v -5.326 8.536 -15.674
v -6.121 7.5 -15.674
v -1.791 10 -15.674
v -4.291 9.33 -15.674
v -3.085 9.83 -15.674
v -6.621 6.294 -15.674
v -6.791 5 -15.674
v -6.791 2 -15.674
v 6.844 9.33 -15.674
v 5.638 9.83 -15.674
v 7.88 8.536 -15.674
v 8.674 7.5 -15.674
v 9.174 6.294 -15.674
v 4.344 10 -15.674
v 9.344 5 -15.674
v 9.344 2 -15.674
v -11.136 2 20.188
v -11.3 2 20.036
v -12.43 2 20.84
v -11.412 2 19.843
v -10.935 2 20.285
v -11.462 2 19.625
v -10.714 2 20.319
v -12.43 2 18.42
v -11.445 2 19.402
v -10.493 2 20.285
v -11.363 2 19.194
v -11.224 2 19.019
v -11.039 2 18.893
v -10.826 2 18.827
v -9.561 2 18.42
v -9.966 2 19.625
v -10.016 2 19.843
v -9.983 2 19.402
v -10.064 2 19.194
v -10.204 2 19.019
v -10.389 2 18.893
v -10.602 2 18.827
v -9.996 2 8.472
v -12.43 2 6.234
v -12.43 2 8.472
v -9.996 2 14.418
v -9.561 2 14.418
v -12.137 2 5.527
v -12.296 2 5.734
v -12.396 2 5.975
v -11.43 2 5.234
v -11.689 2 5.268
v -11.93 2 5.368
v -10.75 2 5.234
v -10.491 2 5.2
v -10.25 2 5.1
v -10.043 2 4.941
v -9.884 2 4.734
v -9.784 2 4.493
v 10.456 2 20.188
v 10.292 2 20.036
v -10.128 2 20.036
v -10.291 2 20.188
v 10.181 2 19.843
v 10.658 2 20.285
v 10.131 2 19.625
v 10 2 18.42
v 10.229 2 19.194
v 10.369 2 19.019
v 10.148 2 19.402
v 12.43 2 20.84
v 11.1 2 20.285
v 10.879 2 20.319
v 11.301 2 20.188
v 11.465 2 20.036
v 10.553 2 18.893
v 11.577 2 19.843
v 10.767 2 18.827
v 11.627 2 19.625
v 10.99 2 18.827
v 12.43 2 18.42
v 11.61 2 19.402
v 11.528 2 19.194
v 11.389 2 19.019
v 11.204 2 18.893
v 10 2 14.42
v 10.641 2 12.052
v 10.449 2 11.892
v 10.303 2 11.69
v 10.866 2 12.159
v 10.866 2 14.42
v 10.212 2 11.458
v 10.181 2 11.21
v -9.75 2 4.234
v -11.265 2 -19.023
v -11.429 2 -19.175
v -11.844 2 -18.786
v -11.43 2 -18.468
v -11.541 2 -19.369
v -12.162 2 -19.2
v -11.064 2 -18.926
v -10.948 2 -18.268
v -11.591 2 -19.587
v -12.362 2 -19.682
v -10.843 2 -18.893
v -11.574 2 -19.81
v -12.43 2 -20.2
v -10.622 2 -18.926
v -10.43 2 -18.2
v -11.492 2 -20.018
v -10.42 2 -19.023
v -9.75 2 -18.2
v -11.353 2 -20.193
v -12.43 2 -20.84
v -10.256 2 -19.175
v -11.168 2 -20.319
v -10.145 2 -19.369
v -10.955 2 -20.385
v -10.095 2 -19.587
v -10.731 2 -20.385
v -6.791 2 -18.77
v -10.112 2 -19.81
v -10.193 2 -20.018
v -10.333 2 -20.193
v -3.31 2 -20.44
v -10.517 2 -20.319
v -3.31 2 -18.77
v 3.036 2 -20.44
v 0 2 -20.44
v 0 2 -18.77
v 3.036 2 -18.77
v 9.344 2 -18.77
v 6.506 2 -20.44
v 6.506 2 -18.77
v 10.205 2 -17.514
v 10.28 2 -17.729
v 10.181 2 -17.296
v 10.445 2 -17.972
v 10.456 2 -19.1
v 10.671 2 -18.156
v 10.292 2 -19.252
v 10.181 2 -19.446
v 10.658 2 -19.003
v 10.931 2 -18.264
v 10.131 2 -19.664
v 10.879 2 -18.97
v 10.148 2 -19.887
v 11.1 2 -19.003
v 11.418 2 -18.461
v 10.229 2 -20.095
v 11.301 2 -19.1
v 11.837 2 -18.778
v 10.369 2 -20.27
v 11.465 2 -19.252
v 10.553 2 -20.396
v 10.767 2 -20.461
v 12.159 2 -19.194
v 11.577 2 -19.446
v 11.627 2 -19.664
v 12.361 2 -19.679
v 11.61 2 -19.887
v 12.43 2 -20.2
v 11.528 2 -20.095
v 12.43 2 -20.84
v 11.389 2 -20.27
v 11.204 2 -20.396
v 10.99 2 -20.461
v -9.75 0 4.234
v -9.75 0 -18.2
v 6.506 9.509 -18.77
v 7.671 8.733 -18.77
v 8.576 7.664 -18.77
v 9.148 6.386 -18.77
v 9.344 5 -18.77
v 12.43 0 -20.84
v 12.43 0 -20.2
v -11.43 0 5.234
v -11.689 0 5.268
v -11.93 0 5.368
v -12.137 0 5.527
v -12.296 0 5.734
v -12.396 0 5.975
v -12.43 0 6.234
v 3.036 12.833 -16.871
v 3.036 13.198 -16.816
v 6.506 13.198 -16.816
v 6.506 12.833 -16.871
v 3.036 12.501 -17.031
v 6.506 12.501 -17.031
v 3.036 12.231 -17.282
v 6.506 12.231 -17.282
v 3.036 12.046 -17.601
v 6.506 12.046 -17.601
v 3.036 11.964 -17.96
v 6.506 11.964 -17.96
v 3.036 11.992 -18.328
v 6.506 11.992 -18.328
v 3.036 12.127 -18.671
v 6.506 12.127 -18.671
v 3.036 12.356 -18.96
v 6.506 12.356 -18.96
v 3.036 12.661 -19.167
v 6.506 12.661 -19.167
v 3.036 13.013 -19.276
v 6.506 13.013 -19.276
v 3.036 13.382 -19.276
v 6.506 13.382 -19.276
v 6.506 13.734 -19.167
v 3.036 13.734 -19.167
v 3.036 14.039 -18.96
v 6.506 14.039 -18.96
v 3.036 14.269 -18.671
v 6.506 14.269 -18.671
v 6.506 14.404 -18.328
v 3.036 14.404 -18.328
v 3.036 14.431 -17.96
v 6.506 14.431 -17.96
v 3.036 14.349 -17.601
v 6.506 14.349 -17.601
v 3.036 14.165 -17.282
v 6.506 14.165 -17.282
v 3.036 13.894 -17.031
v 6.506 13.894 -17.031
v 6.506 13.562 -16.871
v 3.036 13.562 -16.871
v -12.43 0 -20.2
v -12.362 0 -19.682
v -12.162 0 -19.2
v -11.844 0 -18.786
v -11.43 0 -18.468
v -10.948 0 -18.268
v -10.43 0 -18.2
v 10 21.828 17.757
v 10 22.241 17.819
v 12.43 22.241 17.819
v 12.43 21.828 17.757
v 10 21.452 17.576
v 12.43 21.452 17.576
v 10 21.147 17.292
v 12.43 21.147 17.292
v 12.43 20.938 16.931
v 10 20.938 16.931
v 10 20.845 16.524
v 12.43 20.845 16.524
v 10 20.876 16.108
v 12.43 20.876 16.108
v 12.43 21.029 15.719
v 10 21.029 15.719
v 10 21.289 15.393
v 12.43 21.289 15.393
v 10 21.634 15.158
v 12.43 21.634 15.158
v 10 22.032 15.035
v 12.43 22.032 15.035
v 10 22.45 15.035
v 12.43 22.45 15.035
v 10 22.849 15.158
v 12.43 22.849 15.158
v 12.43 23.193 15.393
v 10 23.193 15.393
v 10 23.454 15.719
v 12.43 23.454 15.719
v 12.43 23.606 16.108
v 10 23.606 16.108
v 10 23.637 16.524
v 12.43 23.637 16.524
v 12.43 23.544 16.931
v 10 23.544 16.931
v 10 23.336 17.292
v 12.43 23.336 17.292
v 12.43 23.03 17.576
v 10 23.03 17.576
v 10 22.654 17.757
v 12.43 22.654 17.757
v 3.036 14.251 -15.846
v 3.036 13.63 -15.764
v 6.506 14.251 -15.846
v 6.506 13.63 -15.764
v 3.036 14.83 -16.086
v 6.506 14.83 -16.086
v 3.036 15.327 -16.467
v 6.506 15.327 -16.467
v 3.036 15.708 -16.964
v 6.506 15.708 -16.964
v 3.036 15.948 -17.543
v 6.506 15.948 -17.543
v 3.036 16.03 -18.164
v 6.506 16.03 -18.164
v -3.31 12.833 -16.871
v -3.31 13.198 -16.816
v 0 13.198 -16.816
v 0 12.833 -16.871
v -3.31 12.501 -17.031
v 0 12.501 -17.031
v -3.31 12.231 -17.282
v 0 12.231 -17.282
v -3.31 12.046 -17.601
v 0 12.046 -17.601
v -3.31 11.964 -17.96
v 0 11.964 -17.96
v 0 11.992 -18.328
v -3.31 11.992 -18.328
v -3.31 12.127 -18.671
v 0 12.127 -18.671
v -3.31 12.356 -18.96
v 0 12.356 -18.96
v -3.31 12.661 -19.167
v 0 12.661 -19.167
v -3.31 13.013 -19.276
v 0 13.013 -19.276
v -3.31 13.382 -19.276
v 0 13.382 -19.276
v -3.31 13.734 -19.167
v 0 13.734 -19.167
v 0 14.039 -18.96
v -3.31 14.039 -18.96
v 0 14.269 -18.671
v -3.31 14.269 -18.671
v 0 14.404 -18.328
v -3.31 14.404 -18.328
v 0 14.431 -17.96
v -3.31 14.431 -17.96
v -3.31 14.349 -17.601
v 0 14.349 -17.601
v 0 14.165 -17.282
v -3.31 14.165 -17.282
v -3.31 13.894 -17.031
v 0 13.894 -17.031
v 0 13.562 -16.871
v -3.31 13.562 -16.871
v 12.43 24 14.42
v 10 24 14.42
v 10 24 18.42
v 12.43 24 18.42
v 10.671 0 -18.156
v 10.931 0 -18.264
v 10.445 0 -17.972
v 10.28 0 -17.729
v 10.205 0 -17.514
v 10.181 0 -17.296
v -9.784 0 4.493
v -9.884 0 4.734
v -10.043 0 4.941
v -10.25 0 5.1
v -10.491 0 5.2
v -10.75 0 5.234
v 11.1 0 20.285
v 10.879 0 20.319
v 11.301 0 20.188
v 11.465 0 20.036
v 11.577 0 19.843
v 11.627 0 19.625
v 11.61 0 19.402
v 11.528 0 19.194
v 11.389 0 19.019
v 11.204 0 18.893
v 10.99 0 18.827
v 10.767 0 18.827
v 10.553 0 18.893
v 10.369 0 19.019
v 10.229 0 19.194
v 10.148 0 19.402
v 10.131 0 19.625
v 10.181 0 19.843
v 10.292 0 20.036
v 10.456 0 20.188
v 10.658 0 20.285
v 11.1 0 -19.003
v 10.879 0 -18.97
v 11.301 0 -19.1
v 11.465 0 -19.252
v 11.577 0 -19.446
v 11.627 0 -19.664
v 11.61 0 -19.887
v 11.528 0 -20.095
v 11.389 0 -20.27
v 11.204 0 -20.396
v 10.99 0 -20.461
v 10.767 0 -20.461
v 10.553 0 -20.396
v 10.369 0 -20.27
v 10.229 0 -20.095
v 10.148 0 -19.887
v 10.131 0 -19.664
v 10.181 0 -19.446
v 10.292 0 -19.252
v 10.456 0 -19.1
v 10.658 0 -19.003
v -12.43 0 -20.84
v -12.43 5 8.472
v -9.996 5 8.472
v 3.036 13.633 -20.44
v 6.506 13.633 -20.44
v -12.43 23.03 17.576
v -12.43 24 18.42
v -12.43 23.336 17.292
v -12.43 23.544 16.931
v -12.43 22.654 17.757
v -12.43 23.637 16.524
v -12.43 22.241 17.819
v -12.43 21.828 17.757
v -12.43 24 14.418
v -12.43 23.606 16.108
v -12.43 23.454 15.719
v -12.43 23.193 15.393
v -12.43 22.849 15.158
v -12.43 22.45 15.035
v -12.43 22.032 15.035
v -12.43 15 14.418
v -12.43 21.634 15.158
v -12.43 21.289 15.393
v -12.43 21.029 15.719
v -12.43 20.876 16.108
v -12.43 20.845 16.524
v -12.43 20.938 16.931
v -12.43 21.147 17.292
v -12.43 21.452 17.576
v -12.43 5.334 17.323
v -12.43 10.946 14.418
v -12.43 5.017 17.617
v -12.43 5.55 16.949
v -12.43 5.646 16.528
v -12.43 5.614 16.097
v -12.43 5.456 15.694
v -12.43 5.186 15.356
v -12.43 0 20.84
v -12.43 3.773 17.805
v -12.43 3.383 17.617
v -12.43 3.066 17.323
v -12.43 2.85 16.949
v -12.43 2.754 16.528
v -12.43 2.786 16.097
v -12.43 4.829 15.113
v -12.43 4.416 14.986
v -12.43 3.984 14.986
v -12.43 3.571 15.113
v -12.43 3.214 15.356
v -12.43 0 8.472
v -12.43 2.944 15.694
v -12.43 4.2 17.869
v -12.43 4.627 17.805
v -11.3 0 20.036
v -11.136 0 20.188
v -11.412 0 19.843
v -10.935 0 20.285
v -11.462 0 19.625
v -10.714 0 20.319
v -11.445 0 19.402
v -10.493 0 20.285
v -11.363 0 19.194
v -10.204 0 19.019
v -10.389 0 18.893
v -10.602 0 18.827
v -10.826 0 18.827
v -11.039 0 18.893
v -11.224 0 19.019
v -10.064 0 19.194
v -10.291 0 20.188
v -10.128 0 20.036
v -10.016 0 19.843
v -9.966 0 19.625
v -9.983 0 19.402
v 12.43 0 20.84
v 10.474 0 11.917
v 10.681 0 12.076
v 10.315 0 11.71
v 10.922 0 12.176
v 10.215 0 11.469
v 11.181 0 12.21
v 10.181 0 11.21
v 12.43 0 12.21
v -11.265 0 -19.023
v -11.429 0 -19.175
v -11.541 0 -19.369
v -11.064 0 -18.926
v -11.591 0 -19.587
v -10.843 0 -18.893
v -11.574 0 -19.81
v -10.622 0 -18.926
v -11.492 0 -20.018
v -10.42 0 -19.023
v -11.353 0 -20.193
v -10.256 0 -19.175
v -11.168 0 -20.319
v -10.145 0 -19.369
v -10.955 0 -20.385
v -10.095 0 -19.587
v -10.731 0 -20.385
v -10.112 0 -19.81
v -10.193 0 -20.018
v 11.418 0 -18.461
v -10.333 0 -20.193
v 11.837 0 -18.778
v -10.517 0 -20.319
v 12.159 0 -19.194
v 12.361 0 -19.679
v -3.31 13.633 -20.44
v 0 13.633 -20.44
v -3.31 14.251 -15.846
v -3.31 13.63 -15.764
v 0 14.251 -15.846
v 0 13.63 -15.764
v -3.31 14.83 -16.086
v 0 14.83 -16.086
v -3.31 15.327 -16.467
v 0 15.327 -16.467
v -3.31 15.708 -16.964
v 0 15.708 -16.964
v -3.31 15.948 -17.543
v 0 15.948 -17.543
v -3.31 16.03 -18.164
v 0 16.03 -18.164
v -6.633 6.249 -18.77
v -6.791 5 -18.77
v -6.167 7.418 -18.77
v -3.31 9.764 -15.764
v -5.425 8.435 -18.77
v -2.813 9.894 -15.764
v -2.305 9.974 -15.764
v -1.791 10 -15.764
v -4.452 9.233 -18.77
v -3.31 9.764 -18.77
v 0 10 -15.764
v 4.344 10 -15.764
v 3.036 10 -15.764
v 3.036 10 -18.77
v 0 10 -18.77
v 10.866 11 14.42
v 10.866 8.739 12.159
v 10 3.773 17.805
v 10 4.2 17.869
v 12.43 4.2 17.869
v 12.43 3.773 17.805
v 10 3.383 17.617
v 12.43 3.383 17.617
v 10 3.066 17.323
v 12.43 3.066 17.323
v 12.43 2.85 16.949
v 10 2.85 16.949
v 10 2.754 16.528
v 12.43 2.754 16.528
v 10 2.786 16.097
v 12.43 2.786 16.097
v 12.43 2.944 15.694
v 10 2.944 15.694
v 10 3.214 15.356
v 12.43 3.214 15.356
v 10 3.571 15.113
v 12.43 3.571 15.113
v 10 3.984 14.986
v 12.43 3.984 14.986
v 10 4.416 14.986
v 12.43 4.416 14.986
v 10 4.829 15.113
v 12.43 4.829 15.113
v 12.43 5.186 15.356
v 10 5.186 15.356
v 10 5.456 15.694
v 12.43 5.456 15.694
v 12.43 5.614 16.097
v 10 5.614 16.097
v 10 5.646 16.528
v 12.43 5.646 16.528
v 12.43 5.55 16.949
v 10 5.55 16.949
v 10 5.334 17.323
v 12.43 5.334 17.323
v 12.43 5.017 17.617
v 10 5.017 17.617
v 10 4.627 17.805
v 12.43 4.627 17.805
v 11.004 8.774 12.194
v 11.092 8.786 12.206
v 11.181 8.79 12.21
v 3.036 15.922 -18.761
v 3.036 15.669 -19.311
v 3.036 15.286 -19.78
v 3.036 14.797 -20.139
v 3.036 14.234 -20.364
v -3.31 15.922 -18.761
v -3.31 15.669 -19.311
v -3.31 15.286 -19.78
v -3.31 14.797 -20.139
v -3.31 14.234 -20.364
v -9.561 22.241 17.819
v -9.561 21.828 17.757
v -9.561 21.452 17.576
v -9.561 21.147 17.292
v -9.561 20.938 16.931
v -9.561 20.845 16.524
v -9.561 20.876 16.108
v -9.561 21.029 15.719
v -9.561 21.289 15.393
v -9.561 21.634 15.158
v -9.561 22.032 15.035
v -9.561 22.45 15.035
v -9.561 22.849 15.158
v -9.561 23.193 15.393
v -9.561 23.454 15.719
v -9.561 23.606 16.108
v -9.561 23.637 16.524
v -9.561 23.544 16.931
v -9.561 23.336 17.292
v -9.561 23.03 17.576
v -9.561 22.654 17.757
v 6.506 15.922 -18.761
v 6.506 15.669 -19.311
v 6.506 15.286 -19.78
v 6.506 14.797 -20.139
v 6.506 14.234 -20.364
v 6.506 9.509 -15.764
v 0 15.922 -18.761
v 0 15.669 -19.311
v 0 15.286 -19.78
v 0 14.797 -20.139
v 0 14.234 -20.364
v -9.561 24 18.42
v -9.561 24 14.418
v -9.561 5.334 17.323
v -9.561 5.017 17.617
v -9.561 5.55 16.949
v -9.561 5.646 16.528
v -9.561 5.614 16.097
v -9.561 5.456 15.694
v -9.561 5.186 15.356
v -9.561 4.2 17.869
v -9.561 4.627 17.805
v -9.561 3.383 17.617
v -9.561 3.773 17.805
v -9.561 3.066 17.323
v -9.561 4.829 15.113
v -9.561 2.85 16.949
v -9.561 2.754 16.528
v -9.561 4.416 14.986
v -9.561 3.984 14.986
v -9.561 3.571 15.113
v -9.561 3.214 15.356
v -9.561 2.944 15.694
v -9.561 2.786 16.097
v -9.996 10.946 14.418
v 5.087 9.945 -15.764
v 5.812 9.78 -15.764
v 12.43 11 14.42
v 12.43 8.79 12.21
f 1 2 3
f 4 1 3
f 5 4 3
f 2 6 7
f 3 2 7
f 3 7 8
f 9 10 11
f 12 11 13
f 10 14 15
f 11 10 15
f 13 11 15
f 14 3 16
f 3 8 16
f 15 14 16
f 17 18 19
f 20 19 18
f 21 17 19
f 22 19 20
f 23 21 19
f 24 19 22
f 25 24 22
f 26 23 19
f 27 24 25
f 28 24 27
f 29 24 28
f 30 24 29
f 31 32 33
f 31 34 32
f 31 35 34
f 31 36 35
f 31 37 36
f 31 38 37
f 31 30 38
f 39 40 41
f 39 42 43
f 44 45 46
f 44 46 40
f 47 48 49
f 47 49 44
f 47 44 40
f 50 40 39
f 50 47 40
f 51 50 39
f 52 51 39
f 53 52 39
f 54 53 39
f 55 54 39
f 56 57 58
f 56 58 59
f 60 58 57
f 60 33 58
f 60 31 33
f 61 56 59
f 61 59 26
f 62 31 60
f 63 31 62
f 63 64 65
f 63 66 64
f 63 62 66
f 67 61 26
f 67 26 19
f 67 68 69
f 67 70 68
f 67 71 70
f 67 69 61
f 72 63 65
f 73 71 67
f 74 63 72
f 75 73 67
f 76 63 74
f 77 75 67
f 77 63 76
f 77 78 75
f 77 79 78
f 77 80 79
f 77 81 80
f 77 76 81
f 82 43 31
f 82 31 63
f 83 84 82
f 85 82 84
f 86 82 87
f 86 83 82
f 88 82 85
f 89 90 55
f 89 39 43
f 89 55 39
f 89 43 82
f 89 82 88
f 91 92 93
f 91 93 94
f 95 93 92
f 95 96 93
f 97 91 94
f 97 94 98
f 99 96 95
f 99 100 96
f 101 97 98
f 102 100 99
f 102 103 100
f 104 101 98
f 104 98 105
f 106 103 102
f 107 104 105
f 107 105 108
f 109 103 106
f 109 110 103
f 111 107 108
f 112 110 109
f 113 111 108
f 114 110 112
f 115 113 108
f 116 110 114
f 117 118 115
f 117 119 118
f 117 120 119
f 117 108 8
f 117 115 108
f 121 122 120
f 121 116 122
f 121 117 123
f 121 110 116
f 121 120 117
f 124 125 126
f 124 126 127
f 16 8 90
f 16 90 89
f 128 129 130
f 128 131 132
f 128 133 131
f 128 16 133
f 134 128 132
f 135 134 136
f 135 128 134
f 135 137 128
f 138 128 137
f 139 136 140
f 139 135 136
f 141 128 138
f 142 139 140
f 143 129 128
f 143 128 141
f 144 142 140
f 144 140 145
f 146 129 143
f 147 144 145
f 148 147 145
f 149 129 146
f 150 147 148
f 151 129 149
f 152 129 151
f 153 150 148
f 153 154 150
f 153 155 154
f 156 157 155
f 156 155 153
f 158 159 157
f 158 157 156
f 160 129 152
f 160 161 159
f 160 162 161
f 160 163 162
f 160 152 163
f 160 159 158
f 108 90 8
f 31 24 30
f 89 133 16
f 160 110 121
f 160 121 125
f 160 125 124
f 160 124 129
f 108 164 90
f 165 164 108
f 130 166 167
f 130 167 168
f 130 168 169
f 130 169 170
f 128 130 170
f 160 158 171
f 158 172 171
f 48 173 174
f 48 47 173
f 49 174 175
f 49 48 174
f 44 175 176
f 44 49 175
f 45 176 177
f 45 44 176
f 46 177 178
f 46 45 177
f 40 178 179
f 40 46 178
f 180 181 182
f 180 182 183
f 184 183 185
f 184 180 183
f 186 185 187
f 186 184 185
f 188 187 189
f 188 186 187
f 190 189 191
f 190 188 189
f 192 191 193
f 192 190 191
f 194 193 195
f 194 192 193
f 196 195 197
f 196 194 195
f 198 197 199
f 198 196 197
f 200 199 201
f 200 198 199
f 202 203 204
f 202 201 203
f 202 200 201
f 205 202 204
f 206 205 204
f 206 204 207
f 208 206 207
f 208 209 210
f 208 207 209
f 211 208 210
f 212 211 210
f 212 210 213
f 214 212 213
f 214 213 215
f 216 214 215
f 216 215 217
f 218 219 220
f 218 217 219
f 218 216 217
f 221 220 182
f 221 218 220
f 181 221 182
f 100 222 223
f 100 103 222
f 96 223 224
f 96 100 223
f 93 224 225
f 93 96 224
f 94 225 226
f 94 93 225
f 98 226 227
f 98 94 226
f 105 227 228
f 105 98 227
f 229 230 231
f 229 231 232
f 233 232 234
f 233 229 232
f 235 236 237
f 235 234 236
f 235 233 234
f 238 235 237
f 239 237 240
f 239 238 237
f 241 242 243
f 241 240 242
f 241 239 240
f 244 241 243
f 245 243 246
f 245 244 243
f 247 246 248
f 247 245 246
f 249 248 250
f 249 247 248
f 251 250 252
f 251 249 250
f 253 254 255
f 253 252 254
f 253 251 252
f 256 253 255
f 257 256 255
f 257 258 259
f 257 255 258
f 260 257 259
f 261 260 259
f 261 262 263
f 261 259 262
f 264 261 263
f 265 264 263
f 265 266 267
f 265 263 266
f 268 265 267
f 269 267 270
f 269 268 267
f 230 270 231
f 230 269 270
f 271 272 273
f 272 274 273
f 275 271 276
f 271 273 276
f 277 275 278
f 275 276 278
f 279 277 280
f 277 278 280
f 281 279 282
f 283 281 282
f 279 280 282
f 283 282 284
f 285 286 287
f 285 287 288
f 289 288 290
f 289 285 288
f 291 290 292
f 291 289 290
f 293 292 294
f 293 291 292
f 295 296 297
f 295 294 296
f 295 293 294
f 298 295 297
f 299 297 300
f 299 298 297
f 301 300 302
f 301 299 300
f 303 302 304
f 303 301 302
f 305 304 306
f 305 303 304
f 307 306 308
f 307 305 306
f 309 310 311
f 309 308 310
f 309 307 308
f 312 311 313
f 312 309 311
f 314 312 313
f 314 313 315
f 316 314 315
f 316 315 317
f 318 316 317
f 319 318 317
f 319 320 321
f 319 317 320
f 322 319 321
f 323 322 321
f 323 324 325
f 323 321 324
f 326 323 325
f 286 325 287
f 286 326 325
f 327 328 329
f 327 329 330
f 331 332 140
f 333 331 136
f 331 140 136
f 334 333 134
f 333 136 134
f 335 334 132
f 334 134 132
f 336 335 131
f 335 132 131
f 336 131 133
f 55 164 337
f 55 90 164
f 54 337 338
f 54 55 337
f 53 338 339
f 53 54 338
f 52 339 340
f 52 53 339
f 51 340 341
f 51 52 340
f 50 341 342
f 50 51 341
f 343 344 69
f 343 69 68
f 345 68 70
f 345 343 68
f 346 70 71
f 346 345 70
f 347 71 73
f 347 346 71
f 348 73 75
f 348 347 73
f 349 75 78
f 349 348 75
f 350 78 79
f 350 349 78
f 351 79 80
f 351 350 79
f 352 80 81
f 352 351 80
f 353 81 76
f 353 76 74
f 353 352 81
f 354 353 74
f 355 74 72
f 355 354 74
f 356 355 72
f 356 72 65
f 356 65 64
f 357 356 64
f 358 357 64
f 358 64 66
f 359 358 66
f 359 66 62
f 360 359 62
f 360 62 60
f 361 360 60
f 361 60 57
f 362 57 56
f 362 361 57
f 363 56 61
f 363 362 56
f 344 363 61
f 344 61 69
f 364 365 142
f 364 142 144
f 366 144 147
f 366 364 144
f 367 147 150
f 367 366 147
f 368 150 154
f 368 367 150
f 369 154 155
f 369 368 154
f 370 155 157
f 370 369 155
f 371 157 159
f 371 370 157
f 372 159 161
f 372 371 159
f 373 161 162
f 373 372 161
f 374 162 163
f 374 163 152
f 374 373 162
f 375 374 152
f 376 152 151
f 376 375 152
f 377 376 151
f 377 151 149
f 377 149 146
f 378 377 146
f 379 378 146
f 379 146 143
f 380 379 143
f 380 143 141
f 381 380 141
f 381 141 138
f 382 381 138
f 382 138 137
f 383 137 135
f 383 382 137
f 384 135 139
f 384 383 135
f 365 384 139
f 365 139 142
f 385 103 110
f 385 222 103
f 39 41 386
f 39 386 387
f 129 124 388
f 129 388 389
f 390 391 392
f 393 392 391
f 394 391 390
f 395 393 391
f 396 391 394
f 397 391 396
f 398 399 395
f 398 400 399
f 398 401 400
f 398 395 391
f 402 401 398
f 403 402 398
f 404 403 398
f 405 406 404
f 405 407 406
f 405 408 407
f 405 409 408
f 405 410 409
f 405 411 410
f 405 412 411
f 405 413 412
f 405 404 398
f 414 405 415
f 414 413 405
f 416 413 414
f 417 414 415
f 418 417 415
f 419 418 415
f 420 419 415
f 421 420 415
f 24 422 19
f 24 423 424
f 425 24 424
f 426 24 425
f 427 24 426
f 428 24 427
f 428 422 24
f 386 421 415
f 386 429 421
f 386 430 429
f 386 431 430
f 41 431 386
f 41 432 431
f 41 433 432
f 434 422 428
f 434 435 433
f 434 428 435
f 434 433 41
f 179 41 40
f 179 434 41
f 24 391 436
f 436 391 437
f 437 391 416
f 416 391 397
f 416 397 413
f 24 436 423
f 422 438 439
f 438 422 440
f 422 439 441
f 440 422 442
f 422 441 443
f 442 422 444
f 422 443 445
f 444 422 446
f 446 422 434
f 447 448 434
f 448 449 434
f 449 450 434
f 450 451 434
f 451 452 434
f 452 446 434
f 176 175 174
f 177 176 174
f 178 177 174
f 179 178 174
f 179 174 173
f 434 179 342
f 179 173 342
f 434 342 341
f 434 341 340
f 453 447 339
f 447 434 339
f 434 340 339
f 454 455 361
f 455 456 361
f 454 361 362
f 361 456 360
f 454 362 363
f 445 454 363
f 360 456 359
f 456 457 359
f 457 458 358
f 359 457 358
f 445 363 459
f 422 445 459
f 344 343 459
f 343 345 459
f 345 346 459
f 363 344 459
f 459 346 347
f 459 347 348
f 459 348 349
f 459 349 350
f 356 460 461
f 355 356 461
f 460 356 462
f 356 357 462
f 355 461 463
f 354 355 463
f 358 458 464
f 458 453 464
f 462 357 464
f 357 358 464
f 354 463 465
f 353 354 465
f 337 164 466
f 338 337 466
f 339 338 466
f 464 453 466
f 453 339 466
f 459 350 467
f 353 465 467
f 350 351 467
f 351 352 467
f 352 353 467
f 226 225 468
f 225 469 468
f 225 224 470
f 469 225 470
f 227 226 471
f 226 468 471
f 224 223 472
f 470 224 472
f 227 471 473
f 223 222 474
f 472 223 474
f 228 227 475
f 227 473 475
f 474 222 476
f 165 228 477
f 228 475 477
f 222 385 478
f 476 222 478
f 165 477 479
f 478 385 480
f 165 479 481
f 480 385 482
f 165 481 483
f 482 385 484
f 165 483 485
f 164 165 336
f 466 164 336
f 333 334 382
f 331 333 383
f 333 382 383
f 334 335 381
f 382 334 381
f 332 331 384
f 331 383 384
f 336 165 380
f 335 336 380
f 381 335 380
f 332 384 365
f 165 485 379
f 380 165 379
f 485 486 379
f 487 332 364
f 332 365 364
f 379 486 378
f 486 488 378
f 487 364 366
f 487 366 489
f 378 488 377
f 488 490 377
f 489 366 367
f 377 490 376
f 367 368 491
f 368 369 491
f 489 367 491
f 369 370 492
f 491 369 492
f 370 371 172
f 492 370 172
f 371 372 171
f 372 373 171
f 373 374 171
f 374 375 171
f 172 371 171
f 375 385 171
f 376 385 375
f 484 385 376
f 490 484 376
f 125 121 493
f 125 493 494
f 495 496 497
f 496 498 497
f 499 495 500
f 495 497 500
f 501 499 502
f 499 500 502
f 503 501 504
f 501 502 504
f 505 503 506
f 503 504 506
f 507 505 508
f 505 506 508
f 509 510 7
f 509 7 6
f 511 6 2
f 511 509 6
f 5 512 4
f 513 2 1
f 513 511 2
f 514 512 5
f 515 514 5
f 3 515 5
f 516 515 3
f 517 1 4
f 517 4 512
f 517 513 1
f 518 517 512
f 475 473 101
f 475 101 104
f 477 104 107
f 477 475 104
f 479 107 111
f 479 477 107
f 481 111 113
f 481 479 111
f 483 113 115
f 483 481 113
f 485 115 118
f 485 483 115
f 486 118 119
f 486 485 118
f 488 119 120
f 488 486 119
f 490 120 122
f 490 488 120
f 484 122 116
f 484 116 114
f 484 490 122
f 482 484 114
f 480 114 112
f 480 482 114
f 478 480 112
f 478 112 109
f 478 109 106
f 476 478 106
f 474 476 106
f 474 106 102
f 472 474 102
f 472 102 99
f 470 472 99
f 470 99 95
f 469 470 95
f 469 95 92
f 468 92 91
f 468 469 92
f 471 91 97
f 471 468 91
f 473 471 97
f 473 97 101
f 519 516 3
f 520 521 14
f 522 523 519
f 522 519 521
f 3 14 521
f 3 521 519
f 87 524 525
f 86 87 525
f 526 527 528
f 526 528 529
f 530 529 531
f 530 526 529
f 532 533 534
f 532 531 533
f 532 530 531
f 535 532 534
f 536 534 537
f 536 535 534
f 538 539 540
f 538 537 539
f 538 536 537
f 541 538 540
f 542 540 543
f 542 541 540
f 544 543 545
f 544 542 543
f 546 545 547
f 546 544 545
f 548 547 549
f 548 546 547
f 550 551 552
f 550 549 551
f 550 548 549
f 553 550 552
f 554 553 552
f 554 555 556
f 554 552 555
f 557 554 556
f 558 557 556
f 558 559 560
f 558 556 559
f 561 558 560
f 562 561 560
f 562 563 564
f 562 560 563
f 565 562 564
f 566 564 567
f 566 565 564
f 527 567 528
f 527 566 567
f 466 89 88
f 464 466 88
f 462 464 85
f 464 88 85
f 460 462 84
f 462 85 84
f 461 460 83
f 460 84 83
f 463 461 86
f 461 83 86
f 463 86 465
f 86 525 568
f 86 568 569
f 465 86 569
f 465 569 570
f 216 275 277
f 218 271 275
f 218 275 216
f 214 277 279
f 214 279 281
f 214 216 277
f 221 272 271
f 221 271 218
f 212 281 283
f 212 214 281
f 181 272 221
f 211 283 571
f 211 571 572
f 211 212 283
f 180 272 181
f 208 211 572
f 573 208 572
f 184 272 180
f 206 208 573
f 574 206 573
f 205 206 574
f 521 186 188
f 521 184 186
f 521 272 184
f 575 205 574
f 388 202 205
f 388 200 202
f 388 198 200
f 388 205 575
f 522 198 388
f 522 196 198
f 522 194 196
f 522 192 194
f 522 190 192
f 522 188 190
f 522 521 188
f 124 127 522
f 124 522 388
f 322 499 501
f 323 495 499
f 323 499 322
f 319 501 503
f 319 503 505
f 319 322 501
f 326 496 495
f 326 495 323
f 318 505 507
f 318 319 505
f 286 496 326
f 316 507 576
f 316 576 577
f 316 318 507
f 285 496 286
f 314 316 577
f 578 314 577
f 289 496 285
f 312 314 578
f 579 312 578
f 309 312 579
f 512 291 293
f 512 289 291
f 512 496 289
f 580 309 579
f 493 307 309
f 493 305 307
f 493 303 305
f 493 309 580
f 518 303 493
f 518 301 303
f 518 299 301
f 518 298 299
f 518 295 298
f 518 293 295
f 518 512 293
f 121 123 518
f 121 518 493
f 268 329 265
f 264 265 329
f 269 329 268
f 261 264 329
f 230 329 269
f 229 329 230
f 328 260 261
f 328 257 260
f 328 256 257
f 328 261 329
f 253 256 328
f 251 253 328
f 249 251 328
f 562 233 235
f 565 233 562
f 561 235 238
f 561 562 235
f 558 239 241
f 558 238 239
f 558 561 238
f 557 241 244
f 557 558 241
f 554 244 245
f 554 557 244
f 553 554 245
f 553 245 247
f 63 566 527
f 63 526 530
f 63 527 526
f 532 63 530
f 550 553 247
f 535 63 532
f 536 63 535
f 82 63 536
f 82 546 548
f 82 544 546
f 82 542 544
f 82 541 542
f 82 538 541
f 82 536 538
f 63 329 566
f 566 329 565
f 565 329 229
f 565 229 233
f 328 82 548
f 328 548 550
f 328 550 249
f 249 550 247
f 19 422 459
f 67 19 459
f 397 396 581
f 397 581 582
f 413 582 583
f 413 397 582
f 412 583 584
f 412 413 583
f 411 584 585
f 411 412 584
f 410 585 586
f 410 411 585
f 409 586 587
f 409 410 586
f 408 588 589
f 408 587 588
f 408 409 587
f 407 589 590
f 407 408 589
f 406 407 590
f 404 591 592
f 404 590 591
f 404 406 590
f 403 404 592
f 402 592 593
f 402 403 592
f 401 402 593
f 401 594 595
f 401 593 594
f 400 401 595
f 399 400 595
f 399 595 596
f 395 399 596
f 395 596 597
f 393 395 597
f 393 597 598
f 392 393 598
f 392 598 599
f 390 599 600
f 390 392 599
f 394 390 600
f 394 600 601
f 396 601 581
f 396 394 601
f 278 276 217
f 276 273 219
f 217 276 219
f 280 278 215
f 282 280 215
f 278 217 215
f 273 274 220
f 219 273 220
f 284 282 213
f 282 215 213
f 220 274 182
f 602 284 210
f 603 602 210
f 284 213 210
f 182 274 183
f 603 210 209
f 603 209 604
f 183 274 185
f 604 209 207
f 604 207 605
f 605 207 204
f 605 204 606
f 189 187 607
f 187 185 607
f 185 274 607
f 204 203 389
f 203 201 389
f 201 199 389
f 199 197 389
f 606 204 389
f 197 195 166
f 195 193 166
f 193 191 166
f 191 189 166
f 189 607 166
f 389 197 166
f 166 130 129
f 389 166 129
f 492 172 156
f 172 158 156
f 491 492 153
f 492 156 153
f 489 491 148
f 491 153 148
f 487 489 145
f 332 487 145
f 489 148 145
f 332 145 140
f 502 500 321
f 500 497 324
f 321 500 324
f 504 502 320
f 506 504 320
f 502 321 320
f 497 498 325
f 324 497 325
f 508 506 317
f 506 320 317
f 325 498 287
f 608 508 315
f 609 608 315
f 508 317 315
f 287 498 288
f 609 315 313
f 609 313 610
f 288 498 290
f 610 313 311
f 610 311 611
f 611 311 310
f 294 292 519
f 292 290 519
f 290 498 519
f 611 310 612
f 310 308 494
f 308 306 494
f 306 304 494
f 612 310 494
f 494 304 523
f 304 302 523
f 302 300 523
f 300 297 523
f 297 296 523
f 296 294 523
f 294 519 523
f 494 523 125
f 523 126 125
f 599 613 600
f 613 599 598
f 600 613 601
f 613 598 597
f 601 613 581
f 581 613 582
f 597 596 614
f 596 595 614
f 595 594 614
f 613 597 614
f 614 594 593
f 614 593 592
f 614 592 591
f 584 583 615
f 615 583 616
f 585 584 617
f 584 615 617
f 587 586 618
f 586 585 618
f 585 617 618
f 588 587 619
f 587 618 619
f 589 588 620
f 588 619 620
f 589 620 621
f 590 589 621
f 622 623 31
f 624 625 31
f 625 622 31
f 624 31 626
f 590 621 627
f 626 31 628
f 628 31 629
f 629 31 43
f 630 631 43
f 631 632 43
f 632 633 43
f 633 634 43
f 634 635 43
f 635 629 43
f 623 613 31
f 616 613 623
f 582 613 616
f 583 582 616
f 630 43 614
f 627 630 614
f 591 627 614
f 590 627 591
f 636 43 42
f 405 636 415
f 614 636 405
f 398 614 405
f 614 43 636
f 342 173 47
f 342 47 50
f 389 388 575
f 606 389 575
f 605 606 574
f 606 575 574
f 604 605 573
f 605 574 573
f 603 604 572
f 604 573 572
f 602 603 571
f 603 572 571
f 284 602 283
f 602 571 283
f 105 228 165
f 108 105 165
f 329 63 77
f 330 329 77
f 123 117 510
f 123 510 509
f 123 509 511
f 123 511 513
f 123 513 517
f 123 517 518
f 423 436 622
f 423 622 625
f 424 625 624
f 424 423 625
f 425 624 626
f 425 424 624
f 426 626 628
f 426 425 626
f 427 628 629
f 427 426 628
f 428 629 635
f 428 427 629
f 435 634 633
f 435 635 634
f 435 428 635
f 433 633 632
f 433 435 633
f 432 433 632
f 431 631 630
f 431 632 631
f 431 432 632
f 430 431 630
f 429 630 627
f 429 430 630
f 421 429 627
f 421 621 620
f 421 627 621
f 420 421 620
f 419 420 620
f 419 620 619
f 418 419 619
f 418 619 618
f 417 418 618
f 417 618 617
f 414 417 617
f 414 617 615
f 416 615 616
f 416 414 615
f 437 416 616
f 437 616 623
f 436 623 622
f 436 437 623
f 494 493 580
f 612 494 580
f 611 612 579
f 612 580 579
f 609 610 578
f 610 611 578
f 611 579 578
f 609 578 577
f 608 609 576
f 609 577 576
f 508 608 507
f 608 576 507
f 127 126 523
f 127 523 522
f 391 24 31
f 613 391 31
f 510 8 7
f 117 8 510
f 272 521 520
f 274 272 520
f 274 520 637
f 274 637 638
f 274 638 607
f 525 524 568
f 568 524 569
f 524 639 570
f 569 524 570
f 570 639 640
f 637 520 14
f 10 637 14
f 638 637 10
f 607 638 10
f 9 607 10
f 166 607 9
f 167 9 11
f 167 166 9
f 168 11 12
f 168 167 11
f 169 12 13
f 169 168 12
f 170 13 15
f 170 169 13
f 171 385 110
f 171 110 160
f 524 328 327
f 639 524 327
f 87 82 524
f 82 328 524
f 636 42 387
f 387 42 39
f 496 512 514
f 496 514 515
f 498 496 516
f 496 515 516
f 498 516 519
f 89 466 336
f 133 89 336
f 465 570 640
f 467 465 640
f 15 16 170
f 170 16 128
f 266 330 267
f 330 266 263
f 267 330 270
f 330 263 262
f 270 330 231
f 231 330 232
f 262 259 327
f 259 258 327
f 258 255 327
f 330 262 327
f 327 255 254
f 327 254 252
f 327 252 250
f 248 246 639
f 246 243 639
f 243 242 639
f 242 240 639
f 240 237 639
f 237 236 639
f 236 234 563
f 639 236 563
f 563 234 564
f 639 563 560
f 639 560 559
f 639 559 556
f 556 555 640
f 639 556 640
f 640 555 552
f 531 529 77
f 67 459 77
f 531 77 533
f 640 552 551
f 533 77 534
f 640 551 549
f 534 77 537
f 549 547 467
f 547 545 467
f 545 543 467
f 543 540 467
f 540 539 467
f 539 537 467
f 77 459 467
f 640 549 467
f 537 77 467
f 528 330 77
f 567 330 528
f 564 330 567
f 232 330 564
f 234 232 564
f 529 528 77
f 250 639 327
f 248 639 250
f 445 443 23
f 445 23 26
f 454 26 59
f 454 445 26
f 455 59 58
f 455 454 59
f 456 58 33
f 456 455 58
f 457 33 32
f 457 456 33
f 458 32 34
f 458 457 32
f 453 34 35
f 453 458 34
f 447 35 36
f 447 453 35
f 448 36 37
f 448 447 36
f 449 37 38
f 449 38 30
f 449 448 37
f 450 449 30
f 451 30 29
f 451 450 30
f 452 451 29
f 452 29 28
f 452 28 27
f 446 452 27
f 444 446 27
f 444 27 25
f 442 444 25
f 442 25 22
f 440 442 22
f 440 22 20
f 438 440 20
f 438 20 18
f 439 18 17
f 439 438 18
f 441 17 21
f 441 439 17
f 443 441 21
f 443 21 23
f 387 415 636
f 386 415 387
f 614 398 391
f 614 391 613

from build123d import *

# Parameters (mm, degrees)
SKETCH_1_W                = 24.86
SKETCH_1_H                = 41.68
SKETCH_1_R                = 0.75
EXTRUDE_2_DEPTH           = 2
SKETCH_4_W                = 2.869231424
SKETCH_4_H                = 4.001531821
SKETCH_4_W_2              = 2.43
SKETCH_4_H_2              = 4
EXTRUDE_3_DEPTH           = 24
SKETCH_8_W                = 3.310255182
SKETCH_8_H                = 4.675588029
SKETCH_8_W_2              = 3.47
EXTRUDE_5_DEPTH           = 16.03
FILLET_5_R                = 2.4
FILLET_6_R                = 2.4
FILLET_7_R                = 2.4
FILLET_8_R                = 2.4
CUT_EXTRUDE_7_DEPTH       = 16.03
CUT_EXTRUDE_7_DEPTH_BACK  = 16.03
SKETCH_13_R               = 1.236878532
CUT_EXTRUDE_8_DEPTH       = 16.03
CUT_EXTRUDE_8_DEPTH_BACK  = 16.03
SKETCH_5_R                = 1.45
CUT_EXTRUDE_9_DEPTH       = 16.03
CUT_EXTRUDE_9_DEPTH_BACK  = 16.03
SKETCH_14_R               = 1.4
SKETCH_16_W               = 16.135324728
SKETCH_16_H               = 3.096678483
EXTRUDE_8_DEPTH           = 10
FILLET_10_R               = 5
FILLET_13_R               = 5
SKETCH_17_W               = 2.433704545
SKETCH_17_H               = 5.946026496
SKETCH_17_W_2             = 1.564461462
SKETCH_17_H_2             = 6
EXTRUDE_9_DEPTH           = 15
CHAMFER_1_SIZE            = 10
CHAMFER_2_SIZE            = 10
CUT_EXTRUDE_16_DEPTH      = 10
CUT_EXTRUDE_16_DEPTH_BACK = 10
SKETCH_19_W               = 2.68
SKETCH_19_H               = 23.433804394
CUT_EXTRUDE_17_DEPTH      = 10
CUT_EXTRUDE_17_DEPTH_BACK = 10
SKETCH_18_W               = 2.24898196
SKETCH_18_H               = 30.410340658
FILLET_17_R               = 2
FILLET_18_R               = 2
FILLET_19_R               = 1


with BuildPart() as part:
    # 草图1 → 凸台-拉伸2 (new body)
    with BuildSketch(Plane(origin=(0, 0, 0), x_dir=(1, 0, 0), z_dir=(0, 1, 0))):
        Rectangle(SKETCH_1_W, SKETCH_1_H)
        with Locations(Location((-10.842762007, 19.642978565, 0), (0, 0, 270))):
            Circle(SKETCH_1_R, mode=Mode.SUBTRACT)
        with Locations(Location((10.87870886, 19.719816311, 0), (0, 0, 270))):
            Circle(SKETCH_1_R, mode=Mode.SUBTRACT)
        with Locations(Location((-10.713936696, -19.568538996, 0), (0, 0, 270))):
            Circle(SKETCH_1_R, mode=Mode.SUBTRACT)
        with Locations(Location((10.87870886, -19.568538996, 0), (0, 0, 270))):
            Circle(SKETCH_1_R, mode=Mode.SUBTRACT)
    extrude(amount=EXTRUDE_2_DEPTH)

    # 草图4 → 凸台-拉伸3 (add)
    with BuildSketch(Plane(origin=(0, 0, 0), x_dir=(1, 0, 0), z_dir=(0, 1, 0))):
        with Locations((-10.995384288, -16.41923409)):
            Rectangle(SKETCH_4_W, SKETCH_4_H)
        with Locations((11.215, -16.42)):
            Rectangle(SKETCH_4_W_2, SKETCH_4_H_2)
    extrude(amount=EXTRUDE_3_DEPTH)

    # 草图8 → 凸台-拉伸5 (add)
    with BuildSketch(Plane(origin=(0, 0, 0), x_dir=(1, 0, 0), z_dir=(0, 1, 0))):
        with Locations((-1.655127591, 18.102205985)):
            Rectangle(SKETCH_8_W, SKETCH_8_H)
        with Locations((4.770502505, 18.102205985)):
            Rectangle(SKETCH_8_W_2, SKETCH_8_H)
    extrude(amount=EXTRUDE_5_DEPTH)

    # 圆角5
    fillet_5_edges = [part.edges().sort_by_distance(p)[0] for p in [
        (-1.655127591, 16.03, -15.764411971),
    ]]
    fillet(fillet_5_edges, radius=FILLET_5_R)

    # 圆角6
    fillet_6_edges = [part.edges().sort_by_distance(p)[0] for p in [
        (4.770502505, 16.03, -15.764411971),
    ]]
    fillet(fillet_6_edges, radius=FILLET_6_R)

    # 圆角7
    # the kernel refuses this fillet: 2.4 mm, written as the material it takes off along each edge
    with BuildSketch(Plane(origin=(-2.956430437, 16.03, -20.44), x_dir=(0, 0, 1), z_dir=(1, 0, 0))) as fillet_7_piece_1_section:
        with BuildLine():
            CenterArc((2.4, 2.396773177), FILLET_7_R, 180, 87.028551133)
            Line((0, 2.396773177), (0, 0))
            Line((0, 0), (2.275588029, 0))
        make_face()
    fillet_7_piece_1 = extrude(amount=15.453865884, mode=Mode.PRIVATE)
    fillet_7_piece_1 = split(fillet_7_piece_1, bisect_by=Plane(origin=(0, 16.03, -20.44), z_dir=(1, 0, 0)), keep=Keep.TOP, mode=Mode.PRIVATE)
    add(fillet_7_piece_1, mode=Mode.SUBTRACT)

    # 圆角8
    # the kernel refuses this fillet: 2.4 mm, written as the material it takes off along each edge
    with BuildSketch(Plane(origin=(-9.302188124, 16.03, -20.44), x_dir=(0, 0, 1), z_dir=(1, 0, 0))) as fillet_8_piece_1:
        with BuildLine():
            CenterArc((2.4, 2.396773177), FILLET_8_R, 180, 87.028551133)
            Line((0, 2.396773177), (-0.048, 2.396773177))
            Line((-0.048, 2.396773177), (-0.048, 0))
            Line((-0.048, 0), (0, -0.048))
            ThreePointArc((0, -0.048), (1.137794014, -0.048), (2.273099789, -0.047935464))
            Line((2.273099789, -0.047935464), (2.275588029, 0))
        make_face()
    extrude(amount=15.294121066, mode=Mode.SUBTRACT)

    # 草图13 → 切除-拉伸7 (cut, two sides: drawn at the far end of the back side and taken through both)
    with BuildSketch(Plane(origin=(0, 0, 0), x_dir=(0, 0, -1), z_dir=(1, 0, 0)).offset(-CUT_EXTRUDE_7_DEPTH_BACK)):
        with Locations(Location((18.052862707, 13.197698645, 0), (0, 0, 180))):
            Circle(SKETCH_13_R)
    extrude(amount=CUT_EXTRUDE_7_DEPTH + CUT_EXTRUDE_7_DEPTH_BACK, mode=Mode.SUBTRACT)

    # 草图5 → 切除-拉伸8 (cut, two sides: drawn at the far end of the back side and taken through both)
    with BuildSketch(Plane(origin=(0, 0, 0), x_dir=(0, 0, -1), z_dir=(1, 0, 0)).offset(-CUT_EXTRUDE_8_DEPTH_BACK)):
        with Locations(Location((-16.419309005, 4.2, 0), (0, 0, 180))):
            Circle(SKETCH_5_R)
    extrude(amount=CUT_EXTRUDE_8_DEPTH + CUT_EXTRUDE_8_DEPTH_BACK, mode=Mode.SUBTRACT)

    # 草图14 → 切除-拉伸9 (cut, two sides: drawn at the far end of the back side and taken through both)
    with BuildSketch(Plane(origin=(0, 0, 0), x_dir=(0, 0, -1), z_dir=(1, 0, 0)).offset(-CUT_EXTRUDE_9_DEPTH_BACK)):
        with Locations(Location((-16.419309005, 22.241125132, 0), (0, 0, 180))):
            Circle(SKETCH_14_R)
    extrude(amount=CUT_EXTRUDE_9_DEPTH + CUT_EXTRUDE_9_DEPTH_BACK, mode=Mode.SUBTRACT)

    # 草图16 → 凸台-拉伸8 (add)
    with BuildSketch(Plane(origin=(0, 0, 0), x_dir=(1, 0, 0), z_dir=(0, 1, 0))):
        with Locations((1.276700778, 17.221878583)):
            Rectangle(SKETCH_16_W, SKETCH_16_H)
    extrude(amount=EXTRUDE_8_DEPTH)

    # 圆角10
    fillet_10_edges = [part.edges().sort_by_distance(p)[0] for p in [
        (-6.790961586, 10, -17.221878582),
    ]]
    fillet(fillet_10_edges, radius=FILLET_10_R)

    # 圆角13
    fillet_13_edges = [part.edges().sort_by_distance(p)[0] for p in [
        (9.344363142, 10, -17.221878582),
    ]]
    fillet(fillet_13_edges, radius=FILLET_13_R)

    # 草图17 → 凸台-拉伸9 (add)
    with BuildSketch(Plane(origin=(0, 0, 0), x_dir=(1, 0, 0), z_dir=(0, 1, 0))):
        with Locations((-11.213147728, -11.445454931)):
            Rectangle(SKETCH_17_W, SKETCH_17_H)
        with Locations((11.647769269, -11.42)):
            Rectangle(SKETCH_17_W_2, SKETCH_17_H_2)
    extrude(amount=EXTRUDE_9_DEPTH)

    # 倒角1
    # the kernel refuses this chamfer: 10 mm, written as the material it takes off along each edge
    with BuildSketch(Plane(origin=(-38.14682988, 15, 8.472441683), x_dir=(0, 0, 1), z_dir=(1, 0, 0))) as chamfer_1_piece_1_section:
        Polygon((CHAMFER_1_SIZE, 0), (0, CHAMFER_1_SIZE), (0, 0), align=None)
    chamfer_1_piece_1 = extrude(amount=53.867364305, mode=Mode.PRIVATE)
    chamfer_1_piece_1 = split(chamfer_1_piece_1, bisect_by=Plane(origin=(-38.14682988, 15, 14.418468179), z_dir=(0, 0, -1)), keep=Keep.TOP, mode=Mode.PRIVATE)
    chamfer_1_piece_1 = split(chamfer_1_piece_1, bisect_by=Plane(origin=(10, 15, 8.472441683), z_dir=(-1, 0, 0)), keep=Keep.TOP, mode=Mode.PRIVATE)
    add(chamfer_1_piece_1, mode=Mode.SUBTRACT)

    # 倒角2
    # the kernel refuses this chamfer: 10 mm, written as the material it takes off along each edge
    with BuildSketch(Plane(origin=(38.14682988, 15, 8.42), x_dir=(0, 0, 1), z_dir=(-1, 0, 0))) as chamfer_2_piece_1_section:
        Polygon((CHAMFER_2_SIZE, 0), (0, -CHAMFER_2_SIZE), (0, 0), align=None)
    chamfer_2_piece_1 = extrude(amount=52.998121222, mode=Mode.PRIVATE)
    chamfer_2_piece_1 = split(chamfer_2_piece_1, bisect_by=Plane(origin=(38.14682988, 15, 14.42), z_dir=(0, 0, -1)), keep=Keep.TOP, mode=Mode.PRIVATE)
    chamfer_2_piece_1 = split(chamfer_2_piece_1, bisect_by=Plane(origin=(10, 15, 8.42), z_dir=(1, 0, 0)), keep=Keep.TOP, mode=Mode.PRIVATE)
    add(chamfer_2_piece_1, mode=Mode.SUBTRACT)

    # 草图19 → 切除-拉伸16 (cut, two sides: drawn at the far end of the back side and taken through both)
    with BuildSketch(Plane(origin=(0, 0, 0), x_dir=(1, 0, 0), z_dir=(0, 1, 0)).offset(-CUT_EXTRUDE_16_DEPTH_BACK)):
        with Locations((-11.09, 6.483097803)):
            Rectangle(SKETCH_19_W, SKETCH_19_H)
    extrude(amount=CUT_EXTRUDE_16_DEPTH + CUT_EXTRUDE_16_DEPTH_BACK, mode=Mode.SUBTRACT)

    # 草图18 → 切除-拉伸17 (cut, two sides: drawn at the far end of the back side and taken through both)
    with BuildSketch(Plane(origin=(0, 0, 0), x_dir=(1, 0, 0), z_dir=(0, 1, 0)).offset(-CUT_EXTRUDE_17_DEPTH_BACK)):
        with Locations((11.30550902, 2.994829671)):
            Rectangle(SKETCH_18_W, SKETCH_18_H)
    extrude(amount=CUT_EXTRUDE_17_DEPTH + CUT_EXTRUDE_17_DEPTH_BACK, mode=Mode.SUBTRACT)

    # 圆角17
    fillet_17_edges = [part.edges().sort_by_distance(p)[0] for p in [
        (12.43, 1, -18.2),
    ]]
    fillet(fillet_17_edges, radius=FILLET_17_R)

    # 圆角18
    fillet_18_edges = [part.edges().sort_by_distance(p)[0] for p in [
        (-12.43, 1, -18.2),
    ]]
    fillet(fillet_18_edges, radius=FILLET_18_R)

    # 圆角19
    fillet_19_edges = [part.edges().sort_by_distance(p)[0] for p in [
        (10.18101804, 1, -18.2),
        (10.18101804, 1, 12.210340658),
        (-12.43, 1, 5.233804394),
        (-9.75, 1, 5.233804394),
    ]]
    fillet(fillet_19_edges, radius=FILLET_19_R)


solid = part.part
